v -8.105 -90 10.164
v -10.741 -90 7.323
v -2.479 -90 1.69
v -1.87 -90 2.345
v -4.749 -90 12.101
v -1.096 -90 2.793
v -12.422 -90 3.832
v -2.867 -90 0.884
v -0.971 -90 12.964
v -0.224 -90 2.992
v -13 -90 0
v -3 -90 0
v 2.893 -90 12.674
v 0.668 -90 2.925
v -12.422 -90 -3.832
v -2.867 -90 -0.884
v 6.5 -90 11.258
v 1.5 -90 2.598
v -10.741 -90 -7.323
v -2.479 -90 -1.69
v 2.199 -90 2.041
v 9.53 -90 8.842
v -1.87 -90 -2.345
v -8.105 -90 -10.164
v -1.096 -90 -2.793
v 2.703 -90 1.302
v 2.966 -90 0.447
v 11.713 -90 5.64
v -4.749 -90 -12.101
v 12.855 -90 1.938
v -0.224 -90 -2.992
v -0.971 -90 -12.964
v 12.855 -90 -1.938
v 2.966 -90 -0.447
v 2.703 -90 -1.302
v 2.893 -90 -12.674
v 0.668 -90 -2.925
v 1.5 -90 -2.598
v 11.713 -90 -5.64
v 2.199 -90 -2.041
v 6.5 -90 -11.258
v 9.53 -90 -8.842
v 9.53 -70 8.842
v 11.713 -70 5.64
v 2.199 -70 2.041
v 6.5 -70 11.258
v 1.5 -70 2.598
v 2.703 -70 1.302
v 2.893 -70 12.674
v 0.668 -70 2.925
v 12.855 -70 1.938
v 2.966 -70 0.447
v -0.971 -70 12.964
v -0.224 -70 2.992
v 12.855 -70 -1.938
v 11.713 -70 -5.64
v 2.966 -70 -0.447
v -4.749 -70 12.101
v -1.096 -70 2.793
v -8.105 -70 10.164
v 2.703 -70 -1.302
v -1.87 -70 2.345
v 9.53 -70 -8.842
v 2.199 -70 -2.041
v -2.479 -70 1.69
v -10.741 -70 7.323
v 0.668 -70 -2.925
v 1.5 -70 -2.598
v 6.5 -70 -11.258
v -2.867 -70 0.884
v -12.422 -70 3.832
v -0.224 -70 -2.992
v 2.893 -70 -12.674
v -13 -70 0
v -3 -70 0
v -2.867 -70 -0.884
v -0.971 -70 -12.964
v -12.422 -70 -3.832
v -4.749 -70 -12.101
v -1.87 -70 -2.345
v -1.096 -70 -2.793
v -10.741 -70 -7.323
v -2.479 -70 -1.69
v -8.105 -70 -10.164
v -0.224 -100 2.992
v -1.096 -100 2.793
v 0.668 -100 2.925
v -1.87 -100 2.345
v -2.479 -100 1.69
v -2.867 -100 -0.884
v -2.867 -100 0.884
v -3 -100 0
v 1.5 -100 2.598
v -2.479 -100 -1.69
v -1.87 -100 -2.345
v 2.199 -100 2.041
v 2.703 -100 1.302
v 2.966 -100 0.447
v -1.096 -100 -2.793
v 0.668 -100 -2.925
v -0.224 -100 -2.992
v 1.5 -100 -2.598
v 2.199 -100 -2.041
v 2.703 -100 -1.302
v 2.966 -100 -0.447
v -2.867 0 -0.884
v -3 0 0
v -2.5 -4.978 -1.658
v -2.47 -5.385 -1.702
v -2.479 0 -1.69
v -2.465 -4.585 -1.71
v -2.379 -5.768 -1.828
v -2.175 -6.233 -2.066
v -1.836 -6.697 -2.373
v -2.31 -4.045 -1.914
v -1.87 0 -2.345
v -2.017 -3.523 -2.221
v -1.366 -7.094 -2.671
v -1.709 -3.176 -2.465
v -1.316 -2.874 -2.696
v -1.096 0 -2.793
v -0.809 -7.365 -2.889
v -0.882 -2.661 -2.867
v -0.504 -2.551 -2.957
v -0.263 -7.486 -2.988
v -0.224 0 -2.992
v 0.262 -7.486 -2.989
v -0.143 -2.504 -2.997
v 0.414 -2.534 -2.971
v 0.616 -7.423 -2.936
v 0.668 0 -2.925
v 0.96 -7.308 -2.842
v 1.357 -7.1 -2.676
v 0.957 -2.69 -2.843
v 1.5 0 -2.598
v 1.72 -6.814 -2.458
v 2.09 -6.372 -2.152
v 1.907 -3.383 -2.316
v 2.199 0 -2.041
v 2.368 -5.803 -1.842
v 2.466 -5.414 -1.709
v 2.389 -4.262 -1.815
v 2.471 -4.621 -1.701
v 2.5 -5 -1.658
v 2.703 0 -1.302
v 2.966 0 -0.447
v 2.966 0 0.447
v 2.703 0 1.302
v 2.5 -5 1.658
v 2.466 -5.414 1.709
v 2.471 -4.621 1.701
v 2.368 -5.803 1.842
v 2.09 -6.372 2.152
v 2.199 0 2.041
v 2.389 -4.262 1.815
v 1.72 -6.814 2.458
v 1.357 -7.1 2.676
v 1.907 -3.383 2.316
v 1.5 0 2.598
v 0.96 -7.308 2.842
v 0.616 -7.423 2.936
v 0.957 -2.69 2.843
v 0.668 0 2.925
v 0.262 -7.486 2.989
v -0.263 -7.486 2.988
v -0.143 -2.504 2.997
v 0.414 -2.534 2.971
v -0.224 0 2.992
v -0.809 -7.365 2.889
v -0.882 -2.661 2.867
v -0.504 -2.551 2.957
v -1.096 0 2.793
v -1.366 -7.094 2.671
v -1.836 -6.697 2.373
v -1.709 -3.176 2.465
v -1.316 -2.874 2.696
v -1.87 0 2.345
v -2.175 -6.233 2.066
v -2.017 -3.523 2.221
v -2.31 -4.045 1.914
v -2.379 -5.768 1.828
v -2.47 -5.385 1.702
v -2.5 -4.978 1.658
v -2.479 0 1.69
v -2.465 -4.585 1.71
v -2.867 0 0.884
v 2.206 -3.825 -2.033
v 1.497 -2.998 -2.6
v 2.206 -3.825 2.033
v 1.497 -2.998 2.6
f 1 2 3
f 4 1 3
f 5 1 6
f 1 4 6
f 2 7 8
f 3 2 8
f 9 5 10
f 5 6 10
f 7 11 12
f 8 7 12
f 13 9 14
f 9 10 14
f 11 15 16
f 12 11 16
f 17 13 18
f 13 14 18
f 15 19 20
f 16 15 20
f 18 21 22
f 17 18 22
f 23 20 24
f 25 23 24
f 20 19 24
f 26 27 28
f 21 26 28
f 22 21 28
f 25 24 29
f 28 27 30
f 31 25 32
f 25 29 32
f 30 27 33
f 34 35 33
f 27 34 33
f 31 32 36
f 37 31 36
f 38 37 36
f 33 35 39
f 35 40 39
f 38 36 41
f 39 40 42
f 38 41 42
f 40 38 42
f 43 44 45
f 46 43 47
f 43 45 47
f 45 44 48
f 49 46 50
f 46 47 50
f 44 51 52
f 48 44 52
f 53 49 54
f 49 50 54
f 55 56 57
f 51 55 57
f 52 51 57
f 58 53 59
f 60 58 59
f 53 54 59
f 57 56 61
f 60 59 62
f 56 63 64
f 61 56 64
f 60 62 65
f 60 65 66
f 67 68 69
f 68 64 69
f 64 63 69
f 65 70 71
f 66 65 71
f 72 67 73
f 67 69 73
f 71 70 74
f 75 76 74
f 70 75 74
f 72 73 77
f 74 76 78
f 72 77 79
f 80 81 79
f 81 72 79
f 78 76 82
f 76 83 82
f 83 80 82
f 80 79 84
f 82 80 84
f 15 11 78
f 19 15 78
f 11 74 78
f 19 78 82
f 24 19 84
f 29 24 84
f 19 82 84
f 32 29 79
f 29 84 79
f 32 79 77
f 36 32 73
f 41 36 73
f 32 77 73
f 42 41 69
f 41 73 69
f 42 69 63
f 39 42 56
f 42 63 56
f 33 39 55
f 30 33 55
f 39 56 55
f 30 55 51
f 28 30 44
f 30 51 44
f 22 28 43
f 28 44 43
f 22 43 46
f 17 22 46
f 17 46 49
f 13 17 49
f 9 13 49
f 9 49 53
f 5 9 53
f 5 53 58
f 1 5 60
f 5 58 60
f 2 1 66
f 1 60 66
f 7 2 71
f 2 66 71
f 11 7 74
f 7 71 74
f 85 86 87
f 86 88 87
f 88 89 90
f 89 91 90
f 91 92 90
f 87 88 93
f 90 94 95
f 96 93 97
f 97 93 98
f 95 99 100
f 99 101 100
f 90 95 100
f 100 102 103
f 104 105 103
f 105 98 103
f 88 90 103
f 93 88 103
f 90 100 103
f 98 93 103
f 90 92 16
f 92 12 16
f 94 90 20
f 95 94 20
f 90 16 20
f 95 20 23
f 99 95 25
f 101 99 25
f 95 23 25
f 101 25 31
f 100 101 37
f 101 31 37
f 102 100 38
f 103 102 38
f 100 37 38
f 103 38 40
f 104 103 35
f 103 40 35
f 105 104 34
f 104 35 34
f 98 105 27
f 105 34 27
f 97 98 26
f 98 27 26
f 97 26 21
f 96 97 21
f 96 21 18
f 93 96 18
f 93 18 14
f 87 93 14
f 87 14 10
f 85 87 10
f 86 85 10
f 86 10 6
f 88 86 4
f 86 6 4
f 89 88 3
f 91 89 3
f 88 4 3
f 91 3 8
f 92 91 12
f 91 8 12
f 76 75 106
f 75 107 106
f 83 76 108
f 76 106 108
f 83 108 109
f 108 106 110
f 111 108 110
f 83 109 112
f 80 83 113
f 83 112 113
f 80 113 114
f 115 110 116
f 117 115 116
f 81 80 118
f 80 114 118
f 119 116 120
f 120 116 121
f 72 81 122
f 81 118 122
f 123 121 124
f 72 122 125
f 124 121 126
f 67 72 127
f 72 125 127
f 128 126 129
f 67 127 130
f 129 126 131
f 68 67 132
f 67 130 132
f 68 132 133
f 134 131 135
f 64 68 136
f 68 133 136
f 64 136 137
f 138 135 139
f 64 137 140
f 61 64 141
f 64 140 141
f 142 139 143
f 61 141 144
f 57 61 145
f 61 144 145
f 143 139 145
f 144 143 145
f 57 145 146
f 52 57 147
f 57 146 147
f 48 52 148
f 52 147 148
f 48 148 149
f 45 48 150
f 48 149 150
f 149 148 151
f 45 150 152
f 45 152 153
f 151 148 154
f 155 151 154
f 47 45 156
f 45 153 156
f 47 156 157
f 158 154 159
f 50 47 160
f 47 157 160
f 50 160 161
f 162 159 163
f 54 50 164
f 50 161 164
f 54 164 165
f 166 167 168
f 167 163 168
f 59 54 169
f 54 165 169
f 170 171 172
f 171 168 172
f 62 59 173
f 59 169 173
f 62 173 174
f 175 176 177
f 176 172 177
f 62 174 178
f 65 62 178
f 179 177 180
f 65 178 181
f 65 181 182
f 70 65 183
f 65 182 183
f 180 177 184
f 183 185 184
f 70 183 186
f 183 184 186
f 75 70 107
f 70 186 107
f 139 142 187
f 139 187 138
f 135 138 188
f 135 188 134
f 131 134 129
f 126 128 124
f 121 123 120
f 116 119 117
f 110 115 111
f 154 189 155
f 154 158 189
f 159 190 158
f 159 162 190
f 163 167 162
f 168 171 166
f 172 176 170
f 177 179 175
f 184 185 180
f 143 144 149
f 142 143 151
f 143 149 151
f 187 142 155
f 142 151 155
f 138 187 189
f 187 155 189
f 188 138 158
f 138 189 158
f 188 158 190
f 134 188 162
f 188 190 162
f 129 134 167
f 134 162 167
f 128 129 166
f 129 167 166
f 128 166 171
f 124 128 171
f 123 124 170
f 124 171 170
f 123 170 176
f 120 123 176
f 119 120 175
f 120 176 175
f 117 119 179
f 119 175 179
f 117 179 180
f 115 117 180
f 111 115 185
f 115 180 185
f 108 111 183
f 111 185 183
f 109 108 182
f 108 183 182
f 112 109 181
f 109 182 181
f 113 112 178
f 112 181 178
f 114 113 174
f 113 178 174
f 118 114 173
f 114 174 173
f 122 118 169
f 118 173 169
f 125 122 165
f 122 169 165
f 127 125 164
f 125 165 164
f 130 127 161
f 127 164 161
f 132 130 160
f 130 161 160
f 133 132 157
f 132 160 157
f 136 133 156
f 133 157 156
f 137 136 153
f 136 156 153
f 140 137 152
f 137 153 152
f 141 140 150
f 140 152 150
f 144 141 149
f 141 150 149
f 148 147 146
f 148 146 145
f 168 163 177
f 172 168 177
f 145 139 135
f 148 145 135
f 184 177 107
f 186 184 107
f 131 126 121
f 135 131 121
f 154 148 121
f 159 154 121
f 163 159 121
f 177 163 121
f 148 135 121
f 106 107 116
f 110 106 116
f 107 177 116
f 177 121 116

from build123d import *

# Parameters (mm, degrees)
ESQUISSE2_R                  = 2.5
ENL_V_MAT_EXTRU_1_DEPTH      = 14
ENL_V_MAT_EXTRU_1_DEPTH_BACK = 14


with BuildPart() as part:
    # Esquisse1 → Révolution1 (revolve)
    with BuildSketch(Plane.XY):
        Polygon((0, 0), (0, -100), (-3, -100), (-3, -90), (-13, -90), (-13, -70), (-3, -70), (-3, 0), align=None)
    revolve(axis=Axis((0, 0, 0), (0, -1, 0)))

    # Esquisse2 → Enlèv. mat.-Extru.1 (cut, two sides)
    with BuildSketch(Plane.XY) as enl_v_mat_extru_1_sk:
        with Locations((0, -5)):
            Circle(ESQUISSE2_R)
    extrude(amount=ENL_V_MAT_EXTRU_1_DEPTH, mode=Mode.SUBTRACT)
    extrude(enl_v_mat_extru_1_sk.sketch, amount=-ENL_V_MAT_EXTRU_1_DEPTH_BACK, mode=Mode.SUBTRACT)


solid = part.part
